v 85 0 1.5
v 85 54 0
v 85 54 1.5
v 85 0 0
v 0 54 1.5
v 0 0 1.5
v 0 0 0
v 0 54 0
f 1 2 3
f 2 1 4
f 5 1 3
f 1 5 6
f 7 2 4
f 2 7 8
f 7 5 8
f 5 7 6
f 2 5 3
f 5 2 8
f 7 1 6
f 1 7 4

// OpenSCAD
/* */

// 85 X 54
LENGTH = 85;
WIDTH = 54;
THICKNESS = 1.5;

EPSILON = 0.1;

module cutoff() {
	translate([0, 0, -EPSILON])
	resize([LENGTH+EPSILON*2, WIDTH+EPSILON*3, THICKNESS + EPSILON])
	linear_extrude(1)
	translate([-26.812, 68.269, 0])
	import("holder.dxf");
}

difference() {
	cube([LENGTH, WIDTH, THICKNESS]);
	cutoff();
}
